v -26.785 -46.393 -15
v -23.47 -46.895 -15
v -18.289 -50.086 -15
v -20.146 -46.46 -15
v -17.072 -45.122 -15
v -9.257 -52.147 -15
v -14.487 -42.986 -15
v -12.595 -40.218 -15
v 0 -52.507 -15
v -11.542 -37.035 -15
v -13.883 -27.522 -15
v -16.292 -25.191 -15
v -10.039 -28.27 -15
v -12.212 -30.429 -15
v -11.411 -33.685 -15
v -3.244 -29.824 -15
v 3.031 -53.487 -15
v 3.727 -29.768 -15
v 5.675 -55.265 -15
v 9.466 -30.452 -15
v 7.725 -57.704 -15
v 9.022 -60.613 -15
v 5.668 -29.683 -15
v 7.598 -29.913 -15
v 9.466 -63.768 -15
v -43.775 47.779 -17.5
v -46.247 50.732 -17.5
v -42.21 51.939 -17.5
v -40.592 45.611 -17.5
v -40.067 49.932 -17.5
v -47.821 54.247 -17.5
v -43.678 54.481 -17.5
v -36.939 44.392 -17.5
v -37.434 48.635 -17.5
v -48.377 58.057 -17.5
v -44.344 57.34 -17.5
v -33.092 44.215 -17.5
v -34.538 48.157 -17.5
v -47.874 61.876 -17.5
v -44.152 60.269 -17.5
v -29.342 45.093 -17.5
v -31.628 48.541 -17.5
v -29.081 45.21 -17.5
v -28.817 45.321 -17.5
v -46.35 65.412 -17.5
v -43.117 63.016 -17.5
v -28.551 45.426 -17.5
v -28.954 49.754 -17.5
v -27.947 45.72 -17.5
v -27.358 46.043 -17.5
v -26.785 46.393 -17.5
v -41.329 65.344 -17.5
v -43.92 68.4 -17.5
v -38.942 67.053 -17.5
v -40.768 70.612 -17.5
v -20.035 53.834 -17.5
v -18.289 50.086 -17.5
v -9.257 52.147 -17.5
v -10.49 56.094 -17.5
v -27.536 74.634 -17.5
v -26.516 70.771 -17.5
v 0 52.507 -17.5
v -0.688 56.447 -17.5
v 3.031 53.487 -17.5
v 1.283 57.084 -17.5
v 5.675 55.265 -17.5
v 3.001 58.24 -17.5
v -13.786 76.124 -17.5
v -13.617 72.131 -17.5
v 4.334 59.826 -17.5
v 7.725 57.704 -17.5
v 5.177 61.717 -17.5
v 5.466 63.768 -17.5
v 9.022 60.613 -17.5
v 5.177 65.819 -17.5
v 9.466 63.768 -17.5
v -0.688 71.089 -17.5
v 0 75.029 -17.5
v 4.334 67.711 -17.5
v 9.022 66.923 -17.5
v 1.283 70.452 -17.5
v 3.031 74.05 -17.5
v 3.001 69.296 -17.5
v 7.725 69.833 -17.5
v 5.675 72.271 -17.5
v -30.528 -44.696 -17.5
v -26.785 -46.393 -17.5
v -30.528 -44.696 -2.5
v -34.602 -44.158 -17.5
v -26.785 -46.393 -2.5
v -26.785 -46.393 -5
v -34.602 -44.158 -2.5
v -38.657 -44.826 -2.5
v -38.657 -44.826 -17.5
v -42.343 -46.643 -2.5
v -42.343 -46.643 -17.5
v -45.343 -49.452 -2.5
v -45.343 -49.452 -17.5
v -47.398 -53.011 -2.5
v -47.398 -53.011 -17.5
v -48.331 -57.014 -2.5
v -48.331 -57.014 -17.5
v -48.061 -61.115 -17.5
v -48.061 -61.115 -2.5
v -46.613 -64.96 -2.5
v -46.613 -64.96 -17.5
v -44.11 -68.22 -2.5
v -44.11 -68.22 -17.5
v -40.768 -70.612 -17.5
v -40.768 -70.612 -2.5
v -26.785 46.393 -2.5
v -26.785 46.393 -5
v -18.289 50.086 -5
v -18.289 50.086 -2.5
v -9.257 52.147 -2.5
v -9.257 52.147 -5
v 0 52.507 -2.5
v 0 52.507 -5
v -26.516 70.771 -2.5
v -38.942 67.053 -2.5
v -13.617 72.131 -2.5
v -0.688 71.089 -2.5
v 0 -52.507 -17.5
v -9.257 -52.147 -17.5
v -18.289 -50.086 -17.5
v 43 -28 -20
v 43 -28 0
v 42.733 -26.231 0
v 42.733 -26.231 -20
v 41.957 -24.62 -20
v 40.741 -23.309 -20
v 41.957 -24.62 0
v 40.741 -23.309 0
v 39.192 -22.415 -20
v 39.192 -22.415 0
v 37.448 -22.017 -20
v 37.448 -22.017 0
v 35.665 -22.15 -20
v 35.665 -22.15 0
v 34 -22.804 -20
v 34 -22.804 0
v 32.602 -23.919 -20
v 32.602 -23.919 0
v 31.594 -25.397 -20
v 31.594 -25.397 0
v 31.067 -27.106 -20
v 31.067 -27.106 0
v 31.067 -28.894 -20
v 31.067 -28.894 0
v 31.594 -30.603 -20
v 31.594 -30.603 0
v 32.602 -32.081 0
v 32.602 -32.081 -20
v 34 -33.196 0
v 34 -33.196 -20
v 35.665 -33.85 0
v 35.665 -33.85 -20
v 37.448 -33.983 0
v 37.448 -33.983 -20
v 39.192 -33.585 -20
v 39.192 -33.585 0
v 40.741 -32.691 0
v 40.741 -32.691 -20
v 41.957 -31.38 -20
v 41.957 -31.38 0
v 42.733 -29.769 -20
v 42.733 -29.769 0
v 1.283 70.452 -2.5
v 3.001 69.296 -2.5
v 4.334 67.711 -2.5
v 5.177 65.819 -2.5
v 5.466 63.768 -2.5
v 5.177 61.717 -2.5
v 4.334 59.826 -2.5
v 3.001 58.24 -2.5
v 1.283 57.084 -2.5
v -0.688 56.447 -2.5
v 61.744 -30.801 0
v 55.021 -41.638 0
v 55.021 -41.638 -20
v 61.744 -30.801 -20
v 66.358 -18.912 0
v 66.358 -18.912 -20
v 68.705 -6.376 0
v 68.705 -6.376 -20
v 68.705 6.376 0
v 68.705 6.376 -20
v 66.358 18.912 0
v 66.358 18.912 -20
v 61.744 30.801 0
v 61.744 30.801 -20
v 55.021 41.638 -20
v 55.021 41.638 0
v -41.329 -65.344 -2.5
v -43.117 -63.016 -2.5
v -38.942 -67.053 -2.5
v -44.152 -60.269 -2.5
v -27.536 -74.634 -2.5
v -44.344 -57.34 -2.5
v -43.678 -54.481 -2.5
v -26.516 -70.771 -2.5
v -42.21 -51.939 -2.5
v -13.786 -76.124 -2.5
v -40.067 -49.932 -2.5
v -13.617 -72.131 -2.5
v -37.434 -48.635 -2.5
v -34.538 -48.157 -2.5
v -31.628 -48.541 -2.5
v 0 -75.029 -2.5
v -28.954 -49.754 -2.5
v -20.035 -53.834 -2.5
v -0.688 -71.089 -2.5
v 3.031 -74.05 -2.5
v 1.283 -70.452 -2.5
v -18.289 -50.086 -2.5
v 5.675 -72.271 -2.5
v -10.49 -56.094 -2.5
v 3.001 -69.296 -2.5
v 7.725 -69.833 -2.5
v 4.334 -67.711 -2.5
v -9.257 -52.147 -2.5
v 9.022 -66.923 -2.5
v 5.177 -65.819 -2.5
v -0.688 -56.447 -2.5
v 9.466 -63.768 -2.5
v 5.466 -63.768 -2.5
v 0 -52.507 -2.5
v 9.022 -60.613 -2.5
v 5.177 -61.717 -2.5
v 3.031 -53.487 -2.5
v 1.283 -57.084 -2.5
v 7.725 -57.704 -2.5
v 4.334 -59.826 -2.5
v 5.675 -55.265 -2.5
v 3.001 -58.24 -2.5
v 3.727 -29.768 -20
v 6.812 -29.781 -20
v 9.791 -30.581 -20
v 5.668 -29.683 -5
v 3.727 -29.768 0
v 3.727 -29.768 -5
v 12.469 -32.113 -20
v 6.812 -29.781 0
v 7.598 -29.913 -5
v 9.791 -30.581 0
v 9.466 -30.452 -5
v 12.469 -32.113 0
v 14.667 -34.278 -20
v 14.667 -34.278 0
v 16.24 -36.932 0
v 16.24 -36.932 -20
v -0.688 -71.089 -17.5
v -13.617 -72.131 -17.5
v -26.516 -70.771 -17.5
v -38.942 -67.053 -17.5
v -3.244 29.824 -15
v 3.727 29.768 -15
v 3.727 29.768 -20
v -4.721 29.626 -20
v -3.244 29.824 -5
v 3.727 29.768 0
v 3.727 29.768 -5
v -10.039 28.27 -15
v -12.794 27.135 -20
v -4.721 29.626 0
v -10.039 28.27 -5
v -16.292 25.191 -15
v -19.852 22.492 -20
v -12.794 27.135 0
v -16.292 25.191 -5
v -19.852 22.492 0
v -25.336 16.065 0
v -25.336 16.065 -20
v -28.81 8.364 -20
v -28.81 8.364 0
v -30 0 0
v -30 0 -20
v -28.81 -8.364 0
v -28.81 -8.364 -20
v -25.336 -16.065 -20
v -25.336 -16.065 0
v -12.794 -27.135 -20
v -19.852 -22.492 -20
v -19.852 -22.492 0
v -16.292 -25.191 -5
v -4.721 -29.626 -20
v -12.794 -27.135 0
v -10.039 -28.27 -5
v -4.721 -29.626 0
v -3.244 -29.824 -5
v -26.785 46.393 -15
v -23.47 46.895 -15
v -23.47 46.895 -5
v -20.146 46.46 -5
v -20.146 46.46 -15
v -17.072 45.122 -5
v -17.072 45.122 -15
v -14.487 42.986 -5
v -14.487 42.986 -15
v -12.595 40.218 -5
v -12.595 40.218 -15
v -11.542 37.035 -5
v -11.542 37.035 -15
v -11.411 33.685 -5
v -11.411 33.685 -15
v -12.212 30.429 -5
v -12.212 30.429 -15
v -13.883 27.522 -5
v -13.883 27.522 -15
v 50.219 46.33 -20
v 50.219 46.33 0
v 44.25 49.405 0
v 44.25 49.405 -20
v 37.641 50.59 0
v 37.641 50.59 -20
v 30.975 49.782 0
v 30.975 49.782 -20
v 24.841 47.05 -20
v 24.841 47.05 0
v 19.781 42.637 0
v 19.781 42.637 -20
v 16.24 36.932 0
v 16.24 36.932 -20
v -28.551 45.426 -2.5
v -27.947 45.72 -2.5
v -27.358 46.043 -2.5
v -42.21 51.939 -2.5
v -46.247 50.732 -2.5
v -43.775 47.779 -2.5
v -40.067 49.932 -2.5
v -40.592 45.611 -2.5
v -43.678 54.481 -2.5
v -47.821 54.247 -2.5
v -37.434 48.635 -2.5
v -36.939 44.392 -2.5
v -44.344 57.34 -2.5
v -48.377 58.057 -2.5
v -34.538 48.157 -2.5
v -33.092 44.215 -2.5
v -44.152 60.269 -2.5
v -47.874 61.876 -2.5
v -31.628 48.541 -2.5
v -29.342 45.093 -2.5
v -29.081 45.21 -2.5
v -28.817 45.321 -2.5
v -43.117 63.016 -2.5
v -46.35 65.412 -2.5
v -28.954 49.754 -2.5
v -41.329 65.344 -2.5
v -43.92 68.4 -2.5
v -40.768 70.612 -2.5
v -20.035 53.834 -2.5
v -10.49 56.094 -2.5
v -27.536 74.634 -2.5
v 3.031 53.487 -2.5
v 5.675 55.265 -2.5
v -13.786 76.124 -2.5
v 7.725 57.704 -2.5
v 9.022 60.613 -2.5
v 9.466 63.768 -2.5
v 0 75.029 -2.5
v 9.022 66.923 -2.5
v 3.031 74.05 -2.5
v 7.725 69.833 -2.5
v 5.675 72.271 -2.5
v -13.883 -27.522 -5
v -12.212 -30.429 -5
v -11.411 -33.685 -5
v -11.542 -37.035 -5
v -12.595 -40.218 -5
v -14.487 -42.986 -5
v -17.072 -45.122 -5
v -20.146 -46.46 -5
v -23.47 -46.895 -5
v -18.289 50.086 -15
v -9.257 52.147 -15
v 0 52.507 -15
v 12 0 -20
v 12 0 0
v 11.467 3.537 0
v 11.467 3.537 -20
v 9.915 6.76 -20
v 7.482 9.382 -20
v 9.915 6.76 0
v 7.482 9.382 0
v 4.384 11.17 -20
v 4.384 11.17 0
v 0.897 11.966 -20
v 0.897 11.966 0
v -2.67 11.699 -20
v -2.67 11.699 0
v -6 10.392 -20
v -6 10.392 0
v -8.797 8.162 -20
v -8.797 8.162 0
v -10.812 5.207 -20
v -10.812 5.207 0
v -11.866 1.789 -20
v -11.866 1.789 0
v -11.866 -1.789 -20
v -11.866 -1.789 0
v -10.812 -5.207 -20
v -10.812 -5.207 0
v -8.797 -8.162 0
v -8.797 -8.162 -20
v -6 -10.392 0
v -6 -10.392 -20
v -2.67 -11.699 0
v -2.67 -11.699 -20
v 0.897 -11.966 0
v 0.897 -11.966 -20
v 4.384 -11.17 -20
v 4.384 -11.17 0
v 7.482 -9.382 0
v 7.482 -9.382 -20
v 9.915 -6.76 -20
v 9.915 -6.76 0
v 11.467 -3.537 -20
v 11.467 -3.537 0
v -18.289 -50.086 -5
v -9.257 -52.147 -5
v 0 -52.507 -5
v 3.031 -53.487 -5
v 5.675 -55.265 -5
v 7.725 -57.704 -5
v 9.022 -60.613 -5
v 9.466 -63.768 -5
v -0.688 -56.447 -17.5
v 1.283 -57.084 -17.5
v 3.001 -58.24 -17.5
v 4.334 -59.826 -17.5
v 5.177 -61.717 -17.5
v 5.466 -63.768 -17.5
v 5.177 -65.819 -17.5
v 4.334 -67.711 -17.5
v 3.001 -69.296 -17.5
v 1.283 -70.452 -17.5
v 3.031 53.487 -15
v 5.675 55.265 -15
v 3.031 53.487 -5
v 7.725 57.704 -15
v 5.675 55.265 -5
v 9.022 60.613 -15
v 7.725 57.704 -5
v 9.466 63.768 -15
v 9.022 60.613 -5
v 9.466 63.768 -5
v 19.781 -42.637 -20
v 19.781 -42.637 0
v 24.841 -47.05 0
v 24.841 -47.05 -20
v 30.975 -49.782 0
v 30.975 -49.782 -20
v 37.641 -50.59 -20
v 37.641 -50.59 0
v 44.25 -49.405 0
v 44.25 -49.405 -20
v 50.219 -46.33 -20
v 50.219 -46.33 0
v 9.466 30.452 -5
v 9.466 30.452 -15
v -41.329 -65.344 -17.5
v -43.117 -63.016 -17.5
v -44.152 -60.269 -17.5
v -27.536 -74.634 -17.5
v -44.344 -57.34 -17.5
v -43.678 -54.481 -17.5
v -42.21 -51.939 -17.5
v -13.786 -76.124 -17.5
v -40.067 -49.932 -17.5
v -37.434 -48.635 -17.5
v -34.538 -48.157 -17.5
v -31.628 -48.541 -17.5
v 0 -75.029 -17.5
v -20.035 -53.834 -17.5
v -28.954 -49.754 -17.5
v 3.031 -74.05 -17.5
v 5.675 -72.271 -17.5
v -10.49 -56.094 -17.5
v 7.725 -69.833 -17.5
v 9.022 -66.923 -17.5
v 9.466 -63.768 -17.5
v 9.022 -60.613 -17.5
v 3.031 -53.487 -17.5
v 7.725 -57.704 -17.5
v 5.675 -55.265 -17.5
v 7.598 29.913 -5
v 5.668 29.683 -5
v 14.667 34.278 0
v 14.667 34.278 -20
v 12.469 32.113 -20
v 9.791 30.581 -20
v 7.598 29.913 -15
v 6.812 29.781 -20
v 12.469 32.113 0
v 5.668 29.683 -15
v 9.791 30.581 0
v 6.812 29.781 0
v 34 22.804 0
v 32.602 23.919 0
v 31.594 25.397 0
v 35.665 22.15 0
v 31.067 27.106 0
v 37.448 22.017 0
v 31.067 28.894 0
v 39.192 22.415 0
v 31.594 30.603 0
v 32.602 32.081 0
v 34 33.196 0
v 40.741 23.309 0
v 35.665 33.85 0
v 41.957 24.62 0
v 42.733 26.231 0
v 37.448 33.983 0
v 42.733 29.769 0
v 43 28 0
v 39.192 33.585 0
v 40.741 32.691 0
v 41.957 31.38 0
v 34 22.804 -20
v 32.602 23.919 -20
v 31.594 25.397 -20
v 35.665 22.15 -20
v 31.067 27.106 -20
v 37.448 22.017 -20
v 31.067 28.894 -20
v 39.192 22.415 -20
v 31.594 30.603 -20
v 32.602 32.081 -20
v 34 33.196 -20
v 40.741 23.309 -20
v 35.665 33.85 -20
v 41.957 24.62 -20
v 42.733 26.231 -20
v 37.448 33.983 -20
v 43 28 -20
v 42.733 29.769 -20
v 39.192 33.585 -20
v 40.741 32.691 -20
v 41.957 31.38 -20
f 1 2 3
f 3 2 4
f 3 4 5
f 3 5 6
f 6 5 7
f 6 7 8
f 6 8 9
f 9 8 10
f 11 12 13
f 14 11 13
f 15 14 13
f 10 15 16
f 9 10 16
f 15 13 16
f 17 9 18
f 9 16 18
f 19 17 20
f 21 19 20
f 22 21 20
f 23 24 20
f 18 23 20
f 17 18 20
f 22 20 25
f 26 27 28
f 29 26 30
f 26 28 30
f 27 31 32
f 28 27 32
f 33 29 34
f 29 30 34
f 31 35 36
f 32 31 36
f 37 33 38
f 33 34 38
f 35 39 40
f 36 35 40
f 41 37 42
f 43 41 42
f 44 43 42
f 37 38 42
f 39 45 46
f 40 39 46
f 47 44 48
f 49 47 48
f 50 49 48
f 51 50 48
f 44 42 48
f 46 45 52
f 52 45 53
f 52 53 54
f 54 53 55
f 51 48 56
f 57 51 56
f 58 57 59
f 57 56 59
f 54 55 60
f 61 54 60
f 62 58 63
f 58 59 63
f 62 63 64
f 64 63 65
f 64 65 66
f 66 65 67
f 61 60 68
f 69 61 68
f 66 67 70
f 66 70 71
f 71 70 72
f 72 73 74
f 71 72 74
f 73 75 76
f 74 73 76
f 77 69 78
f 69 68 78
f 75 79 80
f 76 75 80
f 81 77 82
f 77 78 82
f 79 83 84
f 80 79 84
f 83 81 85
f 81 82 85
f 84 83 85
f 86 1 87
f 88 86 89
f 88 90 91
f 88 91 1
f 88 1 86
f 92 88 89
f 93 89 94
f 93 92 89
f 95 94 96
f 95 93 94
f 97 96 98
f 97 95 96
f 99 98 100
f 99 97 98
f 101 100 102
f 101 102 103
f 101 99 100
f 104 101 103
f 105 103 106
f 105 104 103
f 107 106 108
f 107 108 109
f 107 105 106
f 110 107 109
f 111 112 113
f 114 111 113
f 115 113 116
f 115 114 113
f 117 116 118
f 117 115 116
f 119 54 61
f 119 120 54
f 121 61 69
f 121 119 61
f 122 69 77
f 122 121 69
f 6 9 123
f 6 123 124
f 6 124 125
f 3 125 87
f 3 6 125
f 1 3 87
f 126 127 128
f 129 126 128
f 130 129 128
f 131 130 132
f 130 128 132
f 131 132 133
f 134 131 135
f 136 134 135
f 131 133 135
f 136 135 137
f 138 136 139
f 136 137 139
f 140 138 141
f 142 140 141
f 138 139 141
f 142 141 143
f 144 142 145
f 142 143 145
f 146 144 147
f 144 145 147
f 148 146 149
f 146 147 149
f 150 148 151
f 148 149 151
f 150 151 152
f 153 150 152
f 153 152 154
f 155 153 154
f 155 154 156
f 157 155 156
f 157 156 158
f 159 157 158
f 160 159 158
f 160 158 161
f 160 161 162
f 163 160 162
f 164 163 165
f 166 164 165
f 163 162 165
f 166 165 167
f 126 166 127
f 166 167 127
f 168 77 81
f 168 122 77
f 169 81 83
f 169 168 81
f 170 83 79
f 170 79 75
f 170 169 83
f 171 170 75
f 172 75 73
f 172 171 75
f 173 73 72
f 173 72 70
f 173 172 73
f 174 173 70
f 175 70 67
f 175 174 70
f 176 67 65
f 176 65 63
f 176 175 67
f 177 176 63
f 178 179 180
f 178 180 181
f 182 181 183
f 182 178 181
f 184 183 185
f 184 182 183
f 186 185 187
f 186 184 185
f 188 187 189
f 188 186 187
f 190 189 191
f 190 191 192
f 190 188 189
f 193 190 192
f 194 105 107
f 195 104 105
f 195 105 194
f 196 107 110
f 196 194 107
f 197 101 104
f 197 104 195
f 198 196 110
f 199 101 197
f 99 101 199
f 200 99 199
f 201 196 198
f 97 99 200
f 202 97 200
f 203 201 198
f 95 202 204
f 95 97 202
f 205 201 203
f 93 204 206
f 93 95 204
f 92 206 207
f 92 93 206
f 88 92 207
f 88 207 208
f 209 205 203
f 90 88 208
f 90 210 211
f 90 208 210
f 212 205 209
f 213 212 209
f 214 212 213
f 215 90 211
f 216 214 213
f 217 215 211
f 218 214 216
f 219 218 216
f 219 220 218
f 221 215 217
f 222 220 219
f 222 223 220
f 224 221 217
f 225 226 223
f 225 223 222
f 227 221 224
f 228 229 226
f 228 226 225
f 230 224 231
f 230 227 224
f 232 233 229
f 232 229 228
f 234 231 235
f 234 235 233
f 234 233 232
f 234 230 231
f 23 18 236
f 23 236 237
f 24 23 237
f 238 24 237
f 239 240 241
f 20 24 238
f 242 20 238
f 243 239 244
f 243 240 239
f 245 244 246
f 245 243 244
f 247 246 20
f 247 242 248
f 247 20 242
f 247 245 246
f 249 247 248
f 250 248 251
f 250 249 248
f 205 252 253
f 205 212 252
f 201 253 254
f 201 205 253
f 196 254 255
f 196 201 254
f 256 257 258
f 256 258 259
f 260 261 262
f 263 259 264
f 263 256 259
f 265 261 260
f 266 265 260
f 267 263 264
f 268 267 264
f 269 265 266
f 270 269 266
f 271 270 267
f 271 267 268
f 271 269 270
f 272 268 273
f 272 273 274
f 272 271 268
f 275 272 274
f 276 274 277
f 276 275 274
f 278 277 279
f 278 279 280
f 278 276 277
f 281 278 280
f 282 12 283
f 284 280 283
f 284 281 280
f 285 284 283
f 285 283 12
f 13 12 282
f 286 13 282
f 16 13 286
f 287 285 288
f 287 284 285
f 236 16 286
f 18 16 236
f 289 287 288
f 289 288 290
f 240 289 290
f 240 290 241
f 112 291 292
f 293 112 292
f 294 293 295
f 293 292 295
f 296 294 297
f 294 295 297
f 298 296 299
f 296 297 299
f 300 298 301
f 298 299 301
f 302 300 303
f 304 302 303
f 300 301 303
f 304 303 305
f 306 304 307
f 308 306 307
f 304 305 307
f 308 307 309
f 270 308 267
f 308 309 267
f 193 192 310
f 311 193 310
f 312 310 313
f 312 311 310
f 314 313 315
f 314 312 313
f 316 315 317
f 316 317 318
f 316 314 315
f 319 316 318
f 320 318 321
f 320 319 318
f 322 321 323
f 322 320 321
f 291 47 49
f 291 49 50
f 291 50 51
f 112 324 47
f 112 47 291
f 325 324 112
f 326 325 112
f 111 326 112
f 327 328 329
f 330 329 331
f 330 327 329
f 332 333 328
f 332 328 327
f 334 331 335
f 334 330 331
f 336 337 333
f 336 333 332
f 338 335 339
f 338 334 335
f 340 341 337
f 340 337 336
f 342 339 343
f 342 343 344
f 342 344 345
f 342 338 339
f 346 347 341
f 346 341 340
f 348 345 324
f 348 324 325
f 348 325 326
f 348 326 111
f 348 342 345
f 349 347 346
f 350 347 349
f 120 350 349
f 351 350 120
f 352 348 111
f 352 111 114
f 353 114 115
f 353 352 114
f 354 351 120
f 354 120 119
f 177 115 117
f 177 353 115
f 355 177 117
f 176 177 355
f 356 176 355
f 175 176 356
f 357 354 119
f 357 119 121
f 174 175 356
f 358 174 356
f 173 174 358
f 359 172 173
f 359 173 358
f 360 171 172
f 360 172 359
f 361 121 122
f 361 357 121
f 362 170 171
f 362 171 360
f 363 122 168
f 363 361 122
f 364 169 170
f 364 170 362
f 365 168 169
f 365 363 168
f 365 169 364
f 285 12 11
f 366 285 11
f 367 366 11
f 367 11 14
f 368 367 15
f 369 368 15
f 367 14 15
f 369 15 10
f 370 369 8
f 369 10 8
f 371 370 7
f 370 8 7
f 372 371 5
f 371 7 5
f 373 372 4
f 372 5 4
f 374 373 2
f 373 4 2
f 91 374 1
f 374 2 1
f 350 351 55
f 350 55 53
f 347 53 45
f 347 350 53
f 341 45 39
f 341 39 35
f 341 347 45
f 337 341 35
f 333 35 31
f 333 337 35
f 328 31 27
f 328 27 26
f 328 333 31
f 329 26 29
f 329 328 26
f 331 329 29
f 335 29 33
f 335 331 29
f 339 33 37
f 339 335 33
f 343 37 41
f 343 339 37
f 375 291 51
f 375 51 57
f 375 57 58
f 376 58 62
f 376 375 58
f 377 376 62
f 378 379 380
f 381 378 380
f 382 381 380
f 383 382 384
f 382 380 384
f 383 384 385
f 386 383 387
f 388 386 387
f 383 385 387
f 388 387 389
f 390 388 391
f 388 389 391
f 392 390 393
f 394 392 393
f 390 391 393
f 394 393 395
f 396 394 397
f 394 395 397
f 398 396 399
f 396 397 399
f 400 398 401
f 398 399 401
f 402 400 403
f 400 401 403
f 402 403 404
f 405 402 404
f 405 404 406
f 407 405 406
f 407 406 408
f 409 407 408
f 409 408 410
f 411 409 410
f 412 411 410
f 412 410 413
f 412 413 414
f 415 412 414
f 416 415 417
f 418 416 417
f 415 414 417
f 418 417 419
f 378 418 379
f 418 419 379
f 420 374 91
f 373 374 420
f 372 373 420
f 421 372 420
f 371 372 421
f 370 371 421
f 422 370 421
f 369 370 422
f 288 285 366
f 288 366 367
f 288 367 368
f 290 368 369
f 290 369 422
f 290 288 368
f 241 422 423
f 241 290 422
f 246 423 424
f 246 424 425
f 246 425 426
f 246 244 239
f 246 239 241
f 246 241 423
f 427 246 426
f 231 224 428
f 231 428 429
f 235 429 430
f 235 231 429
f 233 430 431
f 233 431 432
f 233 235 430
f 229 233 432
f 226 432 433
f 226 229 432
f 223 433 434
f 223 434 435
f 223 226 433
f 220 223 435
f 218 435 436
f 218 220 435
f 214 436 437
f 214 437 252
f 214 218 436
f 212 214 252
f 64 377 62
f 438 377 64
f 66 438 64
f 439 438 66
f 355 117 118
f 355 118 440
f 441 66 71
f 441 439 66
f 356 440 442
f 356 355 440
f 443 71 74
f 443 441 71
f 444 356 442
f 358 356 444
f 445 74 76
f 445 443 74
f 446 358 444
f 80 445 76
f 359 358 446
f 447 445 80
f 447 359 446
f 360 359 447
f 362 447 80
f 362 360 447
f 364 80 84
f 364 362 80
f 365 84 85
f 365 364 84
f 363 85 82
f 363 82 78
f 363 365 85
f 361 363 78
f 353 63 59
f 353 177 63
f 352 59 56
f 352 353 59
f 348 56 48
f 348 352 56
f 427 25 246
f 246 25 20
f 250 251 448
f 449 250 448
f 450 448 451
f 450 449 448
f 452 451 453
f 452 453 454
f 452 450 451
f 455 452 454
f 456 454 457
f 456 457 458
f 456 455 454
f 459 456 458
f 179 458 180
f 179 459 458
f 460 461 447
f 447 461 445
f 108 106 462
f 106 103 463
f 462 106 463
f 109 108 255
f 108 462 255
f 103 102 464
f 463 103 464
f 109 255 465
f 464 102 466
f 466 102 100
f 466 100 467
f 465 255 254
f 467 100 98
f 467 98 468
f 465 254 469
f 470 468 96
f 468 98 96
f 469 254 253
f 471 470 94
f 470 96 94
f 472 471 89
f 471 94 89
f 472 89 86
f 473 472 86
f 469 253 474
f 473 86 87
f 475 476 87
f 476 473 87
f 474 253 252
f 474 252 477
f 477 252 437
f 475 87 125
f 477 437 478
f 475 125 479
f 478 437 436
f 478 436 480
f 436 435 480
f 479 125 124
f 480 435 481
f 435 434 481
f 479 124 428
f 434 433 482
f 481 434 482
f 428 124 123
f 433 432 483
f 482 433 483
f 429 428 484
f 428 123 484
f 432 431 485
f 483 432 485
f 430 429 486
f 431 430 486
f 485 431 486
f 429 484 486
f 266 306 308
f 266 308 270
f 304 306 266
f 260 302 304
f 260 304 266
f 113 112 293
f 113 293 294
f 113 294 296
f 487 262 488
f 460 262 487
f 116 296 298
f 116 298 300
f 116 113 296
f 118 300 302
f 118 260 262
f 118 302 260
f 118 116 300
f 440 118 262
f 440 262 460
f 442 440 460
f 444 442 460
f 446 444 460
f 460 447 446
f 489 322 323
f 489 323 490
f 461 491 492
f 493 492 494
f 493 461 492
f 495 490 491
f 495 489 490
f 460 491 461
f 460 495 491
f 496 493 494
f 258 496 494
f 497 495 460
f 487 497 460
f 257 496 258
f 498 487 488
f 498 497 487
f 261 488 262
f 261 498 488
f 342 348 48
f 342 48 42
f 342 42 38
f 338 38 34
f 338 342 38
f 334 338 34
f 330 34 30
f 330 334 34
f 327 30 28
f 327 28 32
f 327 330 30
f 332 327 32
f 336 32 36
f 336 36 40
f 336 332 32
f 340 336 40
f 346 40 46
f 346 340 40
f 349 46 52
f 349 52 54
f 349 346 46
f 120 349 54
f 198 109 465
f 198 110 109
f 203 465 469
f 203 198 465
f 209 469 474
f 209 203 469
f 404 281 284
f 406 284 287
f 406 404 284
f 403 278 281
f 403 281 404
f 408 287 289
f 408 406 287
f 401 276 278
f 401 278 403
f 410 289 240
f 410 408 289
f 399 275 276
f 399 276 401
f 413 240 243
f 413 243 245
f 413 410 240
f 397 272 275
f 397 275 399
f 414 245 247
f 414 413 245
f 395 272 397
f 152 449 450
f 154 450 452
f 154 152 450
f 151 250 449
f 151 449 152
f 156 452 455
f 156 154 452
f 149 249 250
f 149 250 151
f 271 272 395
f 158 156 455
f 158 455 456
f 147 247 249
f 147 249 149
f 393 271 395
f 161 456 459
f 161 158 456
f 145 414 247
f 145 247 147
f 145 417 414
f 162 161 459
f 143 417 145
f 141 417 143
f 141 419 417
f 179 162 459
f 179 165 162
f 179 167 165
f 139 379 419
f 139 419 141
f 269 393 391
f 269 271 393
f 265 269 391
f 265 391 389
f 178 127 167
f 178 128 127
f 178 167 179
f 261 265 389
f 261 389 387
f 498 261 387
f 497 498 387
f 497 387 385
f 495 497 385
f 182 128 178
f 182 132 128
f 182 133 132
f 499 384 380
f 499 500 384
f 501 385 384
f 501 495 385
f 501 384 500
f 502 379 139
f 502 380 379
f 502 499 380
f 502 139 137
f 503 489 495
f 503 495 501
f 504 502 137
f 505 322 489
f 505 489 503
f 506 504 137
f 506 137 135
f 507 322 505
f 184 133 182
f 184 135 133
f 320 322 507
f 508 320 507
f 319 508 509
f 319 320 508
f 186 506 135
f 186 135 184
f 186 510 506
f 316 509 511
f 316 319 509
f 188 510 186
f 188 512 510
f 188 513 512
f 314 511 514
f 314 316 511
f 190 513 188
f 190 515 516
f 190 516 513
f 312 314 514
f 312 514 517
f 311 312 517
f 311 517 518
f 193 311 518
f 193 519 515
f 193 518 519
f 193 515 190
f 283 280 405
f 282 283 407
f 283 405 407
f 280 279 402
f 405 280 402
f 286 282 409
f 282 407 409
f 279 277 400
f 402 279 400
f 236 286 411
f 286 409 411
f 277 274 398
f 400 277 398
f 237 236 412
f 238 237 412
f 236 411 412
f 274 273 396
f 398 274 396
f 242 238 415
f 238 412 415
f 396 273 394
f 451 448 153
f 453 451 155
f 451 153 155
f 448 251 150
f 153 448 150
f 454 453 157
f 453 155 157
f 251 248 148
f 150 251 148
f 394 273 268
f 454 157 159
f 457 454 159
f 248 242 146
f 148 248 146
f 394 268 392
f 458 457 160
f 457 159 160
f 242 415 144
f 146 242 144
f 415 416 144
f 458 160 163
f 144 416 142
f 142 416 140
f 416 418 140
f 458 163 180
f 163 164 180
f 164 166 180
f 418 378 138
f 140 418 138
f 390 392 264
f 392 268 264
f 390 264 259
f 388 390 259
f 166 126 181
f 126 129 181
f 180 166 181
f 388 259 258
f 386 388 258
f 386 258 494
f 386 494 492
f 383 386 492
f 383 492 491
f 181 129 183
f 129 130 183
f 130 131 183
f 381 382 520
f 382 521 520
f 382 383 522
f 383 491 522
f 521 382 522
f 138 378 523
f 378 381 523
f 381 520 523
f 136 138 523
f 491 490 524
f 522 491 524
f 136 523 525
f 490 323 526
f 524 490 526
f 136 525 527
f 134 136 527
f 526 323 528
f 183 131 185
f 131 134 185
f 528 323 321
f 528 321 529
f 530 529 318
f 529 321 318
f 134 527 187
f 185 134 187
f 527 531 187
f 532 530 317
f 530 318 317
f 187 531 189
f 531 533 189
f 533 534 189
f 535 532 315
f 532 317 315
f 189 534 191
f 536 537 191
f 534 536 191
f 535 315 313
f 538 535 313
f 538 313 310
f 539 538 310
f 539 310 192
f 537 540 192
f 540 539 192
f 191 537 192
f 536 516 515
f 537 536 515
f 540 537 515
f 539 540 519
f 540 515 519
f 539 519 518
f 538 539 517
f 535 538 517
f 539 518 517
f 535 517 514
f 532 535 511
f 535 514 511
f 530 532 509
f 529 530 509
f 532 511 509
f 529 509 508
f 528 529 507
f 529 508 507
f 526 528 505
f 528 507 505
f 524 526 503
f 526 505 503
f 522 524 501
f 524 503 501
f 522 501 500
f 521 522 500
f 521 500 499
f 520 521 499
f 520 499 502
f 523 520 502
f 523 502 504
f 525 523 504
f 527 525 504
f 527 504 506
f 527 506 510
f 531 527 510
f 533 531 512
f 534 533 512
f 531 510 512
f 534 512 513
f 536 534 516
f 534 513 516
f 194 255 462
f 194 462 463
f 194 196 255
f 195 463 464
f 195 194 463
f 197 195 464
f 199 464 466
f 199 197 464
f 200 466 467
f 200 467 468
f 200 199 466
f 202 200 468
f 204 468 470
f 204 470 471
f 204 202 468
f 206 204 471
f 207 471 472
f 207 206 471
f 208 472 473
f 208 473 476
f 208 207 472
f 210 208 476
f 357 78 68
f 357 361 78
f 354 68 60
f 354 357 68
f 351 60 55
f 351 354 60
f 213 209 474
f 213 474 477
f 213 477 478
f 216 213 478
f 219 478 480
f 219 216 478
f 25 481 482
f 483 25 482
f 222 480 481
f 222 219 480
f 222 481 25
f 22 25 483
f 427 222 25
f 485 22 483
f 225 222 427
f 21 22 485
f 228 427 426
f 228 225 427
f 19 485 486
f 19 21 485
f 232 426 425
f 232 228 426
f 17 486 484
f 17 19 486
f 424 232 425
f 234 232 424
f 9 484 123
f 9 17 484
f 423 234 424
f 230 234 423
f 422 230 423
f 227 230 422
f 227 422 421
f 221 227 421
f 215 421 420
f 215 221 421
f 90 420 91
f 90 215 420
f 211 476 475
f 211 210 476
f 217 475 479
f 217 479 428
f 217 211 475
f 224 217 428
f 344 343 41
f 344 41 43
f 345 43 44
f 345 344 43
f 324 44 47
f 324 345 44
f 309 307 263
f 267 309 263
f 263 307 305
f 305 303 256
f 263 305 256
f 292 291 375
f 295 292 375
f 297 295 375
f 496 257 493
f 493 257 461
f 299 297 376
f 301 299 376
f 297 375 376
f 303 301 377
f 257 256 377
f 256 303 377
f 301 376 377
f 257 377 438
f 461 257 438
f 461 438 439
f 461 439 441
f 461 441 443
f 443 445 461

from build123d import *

# Parameters (mm, degrees)
SKETCH1_R             = 12
SKETCH1_R_2           = 6
BOSS_EXTRUDE1_DEPTH   = 20
BOSS_EXTRUDE2_DEPTH   = 7.5
BOSS_EXTRUDE2_2_DEPTH = 7.5
BOSS_EXTRUDE3_DEPTH   = 5


with BuildPart() as part:
    # Sketch1 → Boss-Extrude1 (new body)
    with BuildSketch(Plane.XY):
        with BuildLine():
            ThreePointArc((3.726717402, 29.767626331), (-30, 0), (3.726717402, -29.767626331))
            ThreePointArc((3.726717402, -29.767626331), (11.179632465, -31.260655735), (16.240407222, -36.931955285))
            ThreePointArc((16.240407222, -36.931955285), (34.277765833, -50.435016351), (55.021040607, -41.637544243))
            ThreePointArc((55.021040607, -41.637544243), (69, 0), (55.021040607, 41.637544243))
            ThreePointArc((55.021040607, 41.637544243), (34.277765833, 50.435016351), (16.240407222, 36.931955285))
            ThreePointArc((16.240407222, 36.931955285), (11.179632465, 31.260655735), (3.726717402, 29.767626331))
        make_face()
        Circle(SKETCH1_R, mode=Mode.SUBTRACT)
        with Locations((37, -28)):
            Circle(SKETCH1_R_2, mode=Mode.SUBTRACT)
        with Locations((37, 28)):
            Circle(SKETCH1_R_2, mode=Mode.SUBTRACT)
    extrude(amount=-BOSS_EXTRUDE1_DEPTH)



with BuildPart() as body_2:
    # Sketch2 → Boss-Extrude2 (new, symmetric)
    with BuildSketch(Plane.XY.offset(-10)):
        with BuildLine():
            ThreePointArc((0, 75.029338215), (-20.696071905, 75.701090057), (-40.76800111, 70.612249245))
            ThreePointArc((-40.76800111, 70.612249245), (-47.155174797, 52.434957534), (-29.342215302, 45.092723837))
            ThreePointArc((-29.342215302, 45.092723837), (-28.949505146, 45.266435927), (-28.550831211, 45.42598608))
            ThreePointArc((-28.550831211, 45.42598608), (-27.650605488, 45.877879071), (-26.78520184, 46.393330477))
            ThreePointArc((-26.78520184, 46.393330477), (-13.82075983, 51.326021178), (0, 52.507034247))
            ThreePointArc((0, 52.507034247), (9.465684914, 63.768186231), (0, 75.029338215))
        make_face()
        with BuildLine():
            ThreePointArc((-0.687840355, 71.088922545), (5.465684914, 63.768186231), (-0.687840355, 56.447449916))
            ThreePointArc((-0.687840355, 56.447449916), (-15.317913255, 55.198724707), (-28.954409532, 49.754065216))
            ThreePointArc((-28.954409532, 49.754065216), (-43.037682802, 53.155902064), (-38.942123297, 67.053292907))
            ThreePointArc((-38.942123297, 67.053292907), (-20.097629603, 71.750364494), (-0.687840355, 71.088922545))
        make_face(mode=Mode.SUBTRACT)
    extrude(amount=BOSS_EXTRUDE2_DEPTH, both=True)


with BuildPart() as body_3:
    # Sketch2 → Boss-Extrude2 2 (new, symmetric)
    with BuildSketch(Plane.XY.offset(-10)):
        with BuildLine():
            ThreePointArc((-40.76800111, -70.612249245), (-20.696071905, -75.701090057), (0, -75.029338215))
            ThreePointArc((0, -75.029338215), (9.465684914, -63.768186231), (0, -52.507034247))
            ThreePointArc((0, -52.507034247), (-13.82075983, -51.326021178), (-26.78520184, -46.393330477))
            ThreePointArc((-26.78520184, -46.393330477), (-46.501784417, -51.155902064), (-40.76800111, -70.612249245))
        make_face()
        with BuildLine():
            ThreePointArc((-0.687840355, -71.088922545), (-20.097629603, -71.750364494), (-38.942123297, -67.053292907))
            ThreePointArc((-38.942123297, -67.053292907), (-43.037682802, -53.155902064), (-28.954409532, -49.754065216))
            ThreePointArc((-28.954409532, -49.754065216), (-15.317913255, -55.198724707), (-0.687840355, -56.447449916))
            ThreePointArc((-0.687840355, -56.447449916), (5.465684914, -63.768186231), (-0.687840355, -71.088922545))
        make_face(mode=Mode.SUBTRACT)
    extrude(amount=BOSS_EXTRUDE2_2_DEPTH, both=True)


with BuildPart() as part_1:
    add(part.part)

    add(body_2.part)  # Boss-Extrude3 merges body 2

    add(body_3.part)  # Boss-Extrude3 merges body 3
    # Sketch3 → Boss-Extrude3 (add, symmetric)
    with BuildSketch(Plane.XY.offset(-10)):
        with BuildLine():
            Line((9.465684914, 30.451837991), (9.465684914, 63.768186231))
            ThreePointArc((9.465684914, 63.768186231), (6.784937065, 56.41269959), (0, 52.507034247))
            ThreePointArc((0, 52.507034247), (-13.82075983, 51.326021178), (-26.78520184, 46.393330477))
            ThreePointArc((-26.78520184, 46.393330477), (-12.59508777, 40.218032027), (-16.29220141, 25.190557223))
            ThreePointArc((-16.29220141, 25.190557223), (-6.68657143, 29.245337449), (3.726717402, 29.767626331))
            ThreePointArc((3.726717402, 29.767626331), (6.638008812, 29.759061773), (9.465684914, 30.451837991))
        make_face()
        with BuildLine():
            ThreePointArc((0, -52.507034247), (6.784937065, -56.41269959), (9.465684914, -63.768186231))
            Line((9.465684914, -63.768186231), (9.465684914, -30.451837991))
            ThreePointArc((9.465684914, -30.451837991), (6.638008812, -29.759061773), (3.726717402, -29.767626331))
            ThreePointArc((3.726717402, -29.767626331), (-6.68657143, -29.245337449), (-16.29220141, -25.190557223))
            ThreePointArc((-16.29220141, -25.190557223), (-12.59508777, -40.218032027), (-26.78520184, -46.393330477))
            ThreePointArc((-26.78520184, -46.393330477), (-13.82075983, -51.326021178), (0, -52.507034247))
        make_face()
    extrude(amount=BOSS_EXTRUDE3_DEPTH, both=True)


solid = part_1.part
